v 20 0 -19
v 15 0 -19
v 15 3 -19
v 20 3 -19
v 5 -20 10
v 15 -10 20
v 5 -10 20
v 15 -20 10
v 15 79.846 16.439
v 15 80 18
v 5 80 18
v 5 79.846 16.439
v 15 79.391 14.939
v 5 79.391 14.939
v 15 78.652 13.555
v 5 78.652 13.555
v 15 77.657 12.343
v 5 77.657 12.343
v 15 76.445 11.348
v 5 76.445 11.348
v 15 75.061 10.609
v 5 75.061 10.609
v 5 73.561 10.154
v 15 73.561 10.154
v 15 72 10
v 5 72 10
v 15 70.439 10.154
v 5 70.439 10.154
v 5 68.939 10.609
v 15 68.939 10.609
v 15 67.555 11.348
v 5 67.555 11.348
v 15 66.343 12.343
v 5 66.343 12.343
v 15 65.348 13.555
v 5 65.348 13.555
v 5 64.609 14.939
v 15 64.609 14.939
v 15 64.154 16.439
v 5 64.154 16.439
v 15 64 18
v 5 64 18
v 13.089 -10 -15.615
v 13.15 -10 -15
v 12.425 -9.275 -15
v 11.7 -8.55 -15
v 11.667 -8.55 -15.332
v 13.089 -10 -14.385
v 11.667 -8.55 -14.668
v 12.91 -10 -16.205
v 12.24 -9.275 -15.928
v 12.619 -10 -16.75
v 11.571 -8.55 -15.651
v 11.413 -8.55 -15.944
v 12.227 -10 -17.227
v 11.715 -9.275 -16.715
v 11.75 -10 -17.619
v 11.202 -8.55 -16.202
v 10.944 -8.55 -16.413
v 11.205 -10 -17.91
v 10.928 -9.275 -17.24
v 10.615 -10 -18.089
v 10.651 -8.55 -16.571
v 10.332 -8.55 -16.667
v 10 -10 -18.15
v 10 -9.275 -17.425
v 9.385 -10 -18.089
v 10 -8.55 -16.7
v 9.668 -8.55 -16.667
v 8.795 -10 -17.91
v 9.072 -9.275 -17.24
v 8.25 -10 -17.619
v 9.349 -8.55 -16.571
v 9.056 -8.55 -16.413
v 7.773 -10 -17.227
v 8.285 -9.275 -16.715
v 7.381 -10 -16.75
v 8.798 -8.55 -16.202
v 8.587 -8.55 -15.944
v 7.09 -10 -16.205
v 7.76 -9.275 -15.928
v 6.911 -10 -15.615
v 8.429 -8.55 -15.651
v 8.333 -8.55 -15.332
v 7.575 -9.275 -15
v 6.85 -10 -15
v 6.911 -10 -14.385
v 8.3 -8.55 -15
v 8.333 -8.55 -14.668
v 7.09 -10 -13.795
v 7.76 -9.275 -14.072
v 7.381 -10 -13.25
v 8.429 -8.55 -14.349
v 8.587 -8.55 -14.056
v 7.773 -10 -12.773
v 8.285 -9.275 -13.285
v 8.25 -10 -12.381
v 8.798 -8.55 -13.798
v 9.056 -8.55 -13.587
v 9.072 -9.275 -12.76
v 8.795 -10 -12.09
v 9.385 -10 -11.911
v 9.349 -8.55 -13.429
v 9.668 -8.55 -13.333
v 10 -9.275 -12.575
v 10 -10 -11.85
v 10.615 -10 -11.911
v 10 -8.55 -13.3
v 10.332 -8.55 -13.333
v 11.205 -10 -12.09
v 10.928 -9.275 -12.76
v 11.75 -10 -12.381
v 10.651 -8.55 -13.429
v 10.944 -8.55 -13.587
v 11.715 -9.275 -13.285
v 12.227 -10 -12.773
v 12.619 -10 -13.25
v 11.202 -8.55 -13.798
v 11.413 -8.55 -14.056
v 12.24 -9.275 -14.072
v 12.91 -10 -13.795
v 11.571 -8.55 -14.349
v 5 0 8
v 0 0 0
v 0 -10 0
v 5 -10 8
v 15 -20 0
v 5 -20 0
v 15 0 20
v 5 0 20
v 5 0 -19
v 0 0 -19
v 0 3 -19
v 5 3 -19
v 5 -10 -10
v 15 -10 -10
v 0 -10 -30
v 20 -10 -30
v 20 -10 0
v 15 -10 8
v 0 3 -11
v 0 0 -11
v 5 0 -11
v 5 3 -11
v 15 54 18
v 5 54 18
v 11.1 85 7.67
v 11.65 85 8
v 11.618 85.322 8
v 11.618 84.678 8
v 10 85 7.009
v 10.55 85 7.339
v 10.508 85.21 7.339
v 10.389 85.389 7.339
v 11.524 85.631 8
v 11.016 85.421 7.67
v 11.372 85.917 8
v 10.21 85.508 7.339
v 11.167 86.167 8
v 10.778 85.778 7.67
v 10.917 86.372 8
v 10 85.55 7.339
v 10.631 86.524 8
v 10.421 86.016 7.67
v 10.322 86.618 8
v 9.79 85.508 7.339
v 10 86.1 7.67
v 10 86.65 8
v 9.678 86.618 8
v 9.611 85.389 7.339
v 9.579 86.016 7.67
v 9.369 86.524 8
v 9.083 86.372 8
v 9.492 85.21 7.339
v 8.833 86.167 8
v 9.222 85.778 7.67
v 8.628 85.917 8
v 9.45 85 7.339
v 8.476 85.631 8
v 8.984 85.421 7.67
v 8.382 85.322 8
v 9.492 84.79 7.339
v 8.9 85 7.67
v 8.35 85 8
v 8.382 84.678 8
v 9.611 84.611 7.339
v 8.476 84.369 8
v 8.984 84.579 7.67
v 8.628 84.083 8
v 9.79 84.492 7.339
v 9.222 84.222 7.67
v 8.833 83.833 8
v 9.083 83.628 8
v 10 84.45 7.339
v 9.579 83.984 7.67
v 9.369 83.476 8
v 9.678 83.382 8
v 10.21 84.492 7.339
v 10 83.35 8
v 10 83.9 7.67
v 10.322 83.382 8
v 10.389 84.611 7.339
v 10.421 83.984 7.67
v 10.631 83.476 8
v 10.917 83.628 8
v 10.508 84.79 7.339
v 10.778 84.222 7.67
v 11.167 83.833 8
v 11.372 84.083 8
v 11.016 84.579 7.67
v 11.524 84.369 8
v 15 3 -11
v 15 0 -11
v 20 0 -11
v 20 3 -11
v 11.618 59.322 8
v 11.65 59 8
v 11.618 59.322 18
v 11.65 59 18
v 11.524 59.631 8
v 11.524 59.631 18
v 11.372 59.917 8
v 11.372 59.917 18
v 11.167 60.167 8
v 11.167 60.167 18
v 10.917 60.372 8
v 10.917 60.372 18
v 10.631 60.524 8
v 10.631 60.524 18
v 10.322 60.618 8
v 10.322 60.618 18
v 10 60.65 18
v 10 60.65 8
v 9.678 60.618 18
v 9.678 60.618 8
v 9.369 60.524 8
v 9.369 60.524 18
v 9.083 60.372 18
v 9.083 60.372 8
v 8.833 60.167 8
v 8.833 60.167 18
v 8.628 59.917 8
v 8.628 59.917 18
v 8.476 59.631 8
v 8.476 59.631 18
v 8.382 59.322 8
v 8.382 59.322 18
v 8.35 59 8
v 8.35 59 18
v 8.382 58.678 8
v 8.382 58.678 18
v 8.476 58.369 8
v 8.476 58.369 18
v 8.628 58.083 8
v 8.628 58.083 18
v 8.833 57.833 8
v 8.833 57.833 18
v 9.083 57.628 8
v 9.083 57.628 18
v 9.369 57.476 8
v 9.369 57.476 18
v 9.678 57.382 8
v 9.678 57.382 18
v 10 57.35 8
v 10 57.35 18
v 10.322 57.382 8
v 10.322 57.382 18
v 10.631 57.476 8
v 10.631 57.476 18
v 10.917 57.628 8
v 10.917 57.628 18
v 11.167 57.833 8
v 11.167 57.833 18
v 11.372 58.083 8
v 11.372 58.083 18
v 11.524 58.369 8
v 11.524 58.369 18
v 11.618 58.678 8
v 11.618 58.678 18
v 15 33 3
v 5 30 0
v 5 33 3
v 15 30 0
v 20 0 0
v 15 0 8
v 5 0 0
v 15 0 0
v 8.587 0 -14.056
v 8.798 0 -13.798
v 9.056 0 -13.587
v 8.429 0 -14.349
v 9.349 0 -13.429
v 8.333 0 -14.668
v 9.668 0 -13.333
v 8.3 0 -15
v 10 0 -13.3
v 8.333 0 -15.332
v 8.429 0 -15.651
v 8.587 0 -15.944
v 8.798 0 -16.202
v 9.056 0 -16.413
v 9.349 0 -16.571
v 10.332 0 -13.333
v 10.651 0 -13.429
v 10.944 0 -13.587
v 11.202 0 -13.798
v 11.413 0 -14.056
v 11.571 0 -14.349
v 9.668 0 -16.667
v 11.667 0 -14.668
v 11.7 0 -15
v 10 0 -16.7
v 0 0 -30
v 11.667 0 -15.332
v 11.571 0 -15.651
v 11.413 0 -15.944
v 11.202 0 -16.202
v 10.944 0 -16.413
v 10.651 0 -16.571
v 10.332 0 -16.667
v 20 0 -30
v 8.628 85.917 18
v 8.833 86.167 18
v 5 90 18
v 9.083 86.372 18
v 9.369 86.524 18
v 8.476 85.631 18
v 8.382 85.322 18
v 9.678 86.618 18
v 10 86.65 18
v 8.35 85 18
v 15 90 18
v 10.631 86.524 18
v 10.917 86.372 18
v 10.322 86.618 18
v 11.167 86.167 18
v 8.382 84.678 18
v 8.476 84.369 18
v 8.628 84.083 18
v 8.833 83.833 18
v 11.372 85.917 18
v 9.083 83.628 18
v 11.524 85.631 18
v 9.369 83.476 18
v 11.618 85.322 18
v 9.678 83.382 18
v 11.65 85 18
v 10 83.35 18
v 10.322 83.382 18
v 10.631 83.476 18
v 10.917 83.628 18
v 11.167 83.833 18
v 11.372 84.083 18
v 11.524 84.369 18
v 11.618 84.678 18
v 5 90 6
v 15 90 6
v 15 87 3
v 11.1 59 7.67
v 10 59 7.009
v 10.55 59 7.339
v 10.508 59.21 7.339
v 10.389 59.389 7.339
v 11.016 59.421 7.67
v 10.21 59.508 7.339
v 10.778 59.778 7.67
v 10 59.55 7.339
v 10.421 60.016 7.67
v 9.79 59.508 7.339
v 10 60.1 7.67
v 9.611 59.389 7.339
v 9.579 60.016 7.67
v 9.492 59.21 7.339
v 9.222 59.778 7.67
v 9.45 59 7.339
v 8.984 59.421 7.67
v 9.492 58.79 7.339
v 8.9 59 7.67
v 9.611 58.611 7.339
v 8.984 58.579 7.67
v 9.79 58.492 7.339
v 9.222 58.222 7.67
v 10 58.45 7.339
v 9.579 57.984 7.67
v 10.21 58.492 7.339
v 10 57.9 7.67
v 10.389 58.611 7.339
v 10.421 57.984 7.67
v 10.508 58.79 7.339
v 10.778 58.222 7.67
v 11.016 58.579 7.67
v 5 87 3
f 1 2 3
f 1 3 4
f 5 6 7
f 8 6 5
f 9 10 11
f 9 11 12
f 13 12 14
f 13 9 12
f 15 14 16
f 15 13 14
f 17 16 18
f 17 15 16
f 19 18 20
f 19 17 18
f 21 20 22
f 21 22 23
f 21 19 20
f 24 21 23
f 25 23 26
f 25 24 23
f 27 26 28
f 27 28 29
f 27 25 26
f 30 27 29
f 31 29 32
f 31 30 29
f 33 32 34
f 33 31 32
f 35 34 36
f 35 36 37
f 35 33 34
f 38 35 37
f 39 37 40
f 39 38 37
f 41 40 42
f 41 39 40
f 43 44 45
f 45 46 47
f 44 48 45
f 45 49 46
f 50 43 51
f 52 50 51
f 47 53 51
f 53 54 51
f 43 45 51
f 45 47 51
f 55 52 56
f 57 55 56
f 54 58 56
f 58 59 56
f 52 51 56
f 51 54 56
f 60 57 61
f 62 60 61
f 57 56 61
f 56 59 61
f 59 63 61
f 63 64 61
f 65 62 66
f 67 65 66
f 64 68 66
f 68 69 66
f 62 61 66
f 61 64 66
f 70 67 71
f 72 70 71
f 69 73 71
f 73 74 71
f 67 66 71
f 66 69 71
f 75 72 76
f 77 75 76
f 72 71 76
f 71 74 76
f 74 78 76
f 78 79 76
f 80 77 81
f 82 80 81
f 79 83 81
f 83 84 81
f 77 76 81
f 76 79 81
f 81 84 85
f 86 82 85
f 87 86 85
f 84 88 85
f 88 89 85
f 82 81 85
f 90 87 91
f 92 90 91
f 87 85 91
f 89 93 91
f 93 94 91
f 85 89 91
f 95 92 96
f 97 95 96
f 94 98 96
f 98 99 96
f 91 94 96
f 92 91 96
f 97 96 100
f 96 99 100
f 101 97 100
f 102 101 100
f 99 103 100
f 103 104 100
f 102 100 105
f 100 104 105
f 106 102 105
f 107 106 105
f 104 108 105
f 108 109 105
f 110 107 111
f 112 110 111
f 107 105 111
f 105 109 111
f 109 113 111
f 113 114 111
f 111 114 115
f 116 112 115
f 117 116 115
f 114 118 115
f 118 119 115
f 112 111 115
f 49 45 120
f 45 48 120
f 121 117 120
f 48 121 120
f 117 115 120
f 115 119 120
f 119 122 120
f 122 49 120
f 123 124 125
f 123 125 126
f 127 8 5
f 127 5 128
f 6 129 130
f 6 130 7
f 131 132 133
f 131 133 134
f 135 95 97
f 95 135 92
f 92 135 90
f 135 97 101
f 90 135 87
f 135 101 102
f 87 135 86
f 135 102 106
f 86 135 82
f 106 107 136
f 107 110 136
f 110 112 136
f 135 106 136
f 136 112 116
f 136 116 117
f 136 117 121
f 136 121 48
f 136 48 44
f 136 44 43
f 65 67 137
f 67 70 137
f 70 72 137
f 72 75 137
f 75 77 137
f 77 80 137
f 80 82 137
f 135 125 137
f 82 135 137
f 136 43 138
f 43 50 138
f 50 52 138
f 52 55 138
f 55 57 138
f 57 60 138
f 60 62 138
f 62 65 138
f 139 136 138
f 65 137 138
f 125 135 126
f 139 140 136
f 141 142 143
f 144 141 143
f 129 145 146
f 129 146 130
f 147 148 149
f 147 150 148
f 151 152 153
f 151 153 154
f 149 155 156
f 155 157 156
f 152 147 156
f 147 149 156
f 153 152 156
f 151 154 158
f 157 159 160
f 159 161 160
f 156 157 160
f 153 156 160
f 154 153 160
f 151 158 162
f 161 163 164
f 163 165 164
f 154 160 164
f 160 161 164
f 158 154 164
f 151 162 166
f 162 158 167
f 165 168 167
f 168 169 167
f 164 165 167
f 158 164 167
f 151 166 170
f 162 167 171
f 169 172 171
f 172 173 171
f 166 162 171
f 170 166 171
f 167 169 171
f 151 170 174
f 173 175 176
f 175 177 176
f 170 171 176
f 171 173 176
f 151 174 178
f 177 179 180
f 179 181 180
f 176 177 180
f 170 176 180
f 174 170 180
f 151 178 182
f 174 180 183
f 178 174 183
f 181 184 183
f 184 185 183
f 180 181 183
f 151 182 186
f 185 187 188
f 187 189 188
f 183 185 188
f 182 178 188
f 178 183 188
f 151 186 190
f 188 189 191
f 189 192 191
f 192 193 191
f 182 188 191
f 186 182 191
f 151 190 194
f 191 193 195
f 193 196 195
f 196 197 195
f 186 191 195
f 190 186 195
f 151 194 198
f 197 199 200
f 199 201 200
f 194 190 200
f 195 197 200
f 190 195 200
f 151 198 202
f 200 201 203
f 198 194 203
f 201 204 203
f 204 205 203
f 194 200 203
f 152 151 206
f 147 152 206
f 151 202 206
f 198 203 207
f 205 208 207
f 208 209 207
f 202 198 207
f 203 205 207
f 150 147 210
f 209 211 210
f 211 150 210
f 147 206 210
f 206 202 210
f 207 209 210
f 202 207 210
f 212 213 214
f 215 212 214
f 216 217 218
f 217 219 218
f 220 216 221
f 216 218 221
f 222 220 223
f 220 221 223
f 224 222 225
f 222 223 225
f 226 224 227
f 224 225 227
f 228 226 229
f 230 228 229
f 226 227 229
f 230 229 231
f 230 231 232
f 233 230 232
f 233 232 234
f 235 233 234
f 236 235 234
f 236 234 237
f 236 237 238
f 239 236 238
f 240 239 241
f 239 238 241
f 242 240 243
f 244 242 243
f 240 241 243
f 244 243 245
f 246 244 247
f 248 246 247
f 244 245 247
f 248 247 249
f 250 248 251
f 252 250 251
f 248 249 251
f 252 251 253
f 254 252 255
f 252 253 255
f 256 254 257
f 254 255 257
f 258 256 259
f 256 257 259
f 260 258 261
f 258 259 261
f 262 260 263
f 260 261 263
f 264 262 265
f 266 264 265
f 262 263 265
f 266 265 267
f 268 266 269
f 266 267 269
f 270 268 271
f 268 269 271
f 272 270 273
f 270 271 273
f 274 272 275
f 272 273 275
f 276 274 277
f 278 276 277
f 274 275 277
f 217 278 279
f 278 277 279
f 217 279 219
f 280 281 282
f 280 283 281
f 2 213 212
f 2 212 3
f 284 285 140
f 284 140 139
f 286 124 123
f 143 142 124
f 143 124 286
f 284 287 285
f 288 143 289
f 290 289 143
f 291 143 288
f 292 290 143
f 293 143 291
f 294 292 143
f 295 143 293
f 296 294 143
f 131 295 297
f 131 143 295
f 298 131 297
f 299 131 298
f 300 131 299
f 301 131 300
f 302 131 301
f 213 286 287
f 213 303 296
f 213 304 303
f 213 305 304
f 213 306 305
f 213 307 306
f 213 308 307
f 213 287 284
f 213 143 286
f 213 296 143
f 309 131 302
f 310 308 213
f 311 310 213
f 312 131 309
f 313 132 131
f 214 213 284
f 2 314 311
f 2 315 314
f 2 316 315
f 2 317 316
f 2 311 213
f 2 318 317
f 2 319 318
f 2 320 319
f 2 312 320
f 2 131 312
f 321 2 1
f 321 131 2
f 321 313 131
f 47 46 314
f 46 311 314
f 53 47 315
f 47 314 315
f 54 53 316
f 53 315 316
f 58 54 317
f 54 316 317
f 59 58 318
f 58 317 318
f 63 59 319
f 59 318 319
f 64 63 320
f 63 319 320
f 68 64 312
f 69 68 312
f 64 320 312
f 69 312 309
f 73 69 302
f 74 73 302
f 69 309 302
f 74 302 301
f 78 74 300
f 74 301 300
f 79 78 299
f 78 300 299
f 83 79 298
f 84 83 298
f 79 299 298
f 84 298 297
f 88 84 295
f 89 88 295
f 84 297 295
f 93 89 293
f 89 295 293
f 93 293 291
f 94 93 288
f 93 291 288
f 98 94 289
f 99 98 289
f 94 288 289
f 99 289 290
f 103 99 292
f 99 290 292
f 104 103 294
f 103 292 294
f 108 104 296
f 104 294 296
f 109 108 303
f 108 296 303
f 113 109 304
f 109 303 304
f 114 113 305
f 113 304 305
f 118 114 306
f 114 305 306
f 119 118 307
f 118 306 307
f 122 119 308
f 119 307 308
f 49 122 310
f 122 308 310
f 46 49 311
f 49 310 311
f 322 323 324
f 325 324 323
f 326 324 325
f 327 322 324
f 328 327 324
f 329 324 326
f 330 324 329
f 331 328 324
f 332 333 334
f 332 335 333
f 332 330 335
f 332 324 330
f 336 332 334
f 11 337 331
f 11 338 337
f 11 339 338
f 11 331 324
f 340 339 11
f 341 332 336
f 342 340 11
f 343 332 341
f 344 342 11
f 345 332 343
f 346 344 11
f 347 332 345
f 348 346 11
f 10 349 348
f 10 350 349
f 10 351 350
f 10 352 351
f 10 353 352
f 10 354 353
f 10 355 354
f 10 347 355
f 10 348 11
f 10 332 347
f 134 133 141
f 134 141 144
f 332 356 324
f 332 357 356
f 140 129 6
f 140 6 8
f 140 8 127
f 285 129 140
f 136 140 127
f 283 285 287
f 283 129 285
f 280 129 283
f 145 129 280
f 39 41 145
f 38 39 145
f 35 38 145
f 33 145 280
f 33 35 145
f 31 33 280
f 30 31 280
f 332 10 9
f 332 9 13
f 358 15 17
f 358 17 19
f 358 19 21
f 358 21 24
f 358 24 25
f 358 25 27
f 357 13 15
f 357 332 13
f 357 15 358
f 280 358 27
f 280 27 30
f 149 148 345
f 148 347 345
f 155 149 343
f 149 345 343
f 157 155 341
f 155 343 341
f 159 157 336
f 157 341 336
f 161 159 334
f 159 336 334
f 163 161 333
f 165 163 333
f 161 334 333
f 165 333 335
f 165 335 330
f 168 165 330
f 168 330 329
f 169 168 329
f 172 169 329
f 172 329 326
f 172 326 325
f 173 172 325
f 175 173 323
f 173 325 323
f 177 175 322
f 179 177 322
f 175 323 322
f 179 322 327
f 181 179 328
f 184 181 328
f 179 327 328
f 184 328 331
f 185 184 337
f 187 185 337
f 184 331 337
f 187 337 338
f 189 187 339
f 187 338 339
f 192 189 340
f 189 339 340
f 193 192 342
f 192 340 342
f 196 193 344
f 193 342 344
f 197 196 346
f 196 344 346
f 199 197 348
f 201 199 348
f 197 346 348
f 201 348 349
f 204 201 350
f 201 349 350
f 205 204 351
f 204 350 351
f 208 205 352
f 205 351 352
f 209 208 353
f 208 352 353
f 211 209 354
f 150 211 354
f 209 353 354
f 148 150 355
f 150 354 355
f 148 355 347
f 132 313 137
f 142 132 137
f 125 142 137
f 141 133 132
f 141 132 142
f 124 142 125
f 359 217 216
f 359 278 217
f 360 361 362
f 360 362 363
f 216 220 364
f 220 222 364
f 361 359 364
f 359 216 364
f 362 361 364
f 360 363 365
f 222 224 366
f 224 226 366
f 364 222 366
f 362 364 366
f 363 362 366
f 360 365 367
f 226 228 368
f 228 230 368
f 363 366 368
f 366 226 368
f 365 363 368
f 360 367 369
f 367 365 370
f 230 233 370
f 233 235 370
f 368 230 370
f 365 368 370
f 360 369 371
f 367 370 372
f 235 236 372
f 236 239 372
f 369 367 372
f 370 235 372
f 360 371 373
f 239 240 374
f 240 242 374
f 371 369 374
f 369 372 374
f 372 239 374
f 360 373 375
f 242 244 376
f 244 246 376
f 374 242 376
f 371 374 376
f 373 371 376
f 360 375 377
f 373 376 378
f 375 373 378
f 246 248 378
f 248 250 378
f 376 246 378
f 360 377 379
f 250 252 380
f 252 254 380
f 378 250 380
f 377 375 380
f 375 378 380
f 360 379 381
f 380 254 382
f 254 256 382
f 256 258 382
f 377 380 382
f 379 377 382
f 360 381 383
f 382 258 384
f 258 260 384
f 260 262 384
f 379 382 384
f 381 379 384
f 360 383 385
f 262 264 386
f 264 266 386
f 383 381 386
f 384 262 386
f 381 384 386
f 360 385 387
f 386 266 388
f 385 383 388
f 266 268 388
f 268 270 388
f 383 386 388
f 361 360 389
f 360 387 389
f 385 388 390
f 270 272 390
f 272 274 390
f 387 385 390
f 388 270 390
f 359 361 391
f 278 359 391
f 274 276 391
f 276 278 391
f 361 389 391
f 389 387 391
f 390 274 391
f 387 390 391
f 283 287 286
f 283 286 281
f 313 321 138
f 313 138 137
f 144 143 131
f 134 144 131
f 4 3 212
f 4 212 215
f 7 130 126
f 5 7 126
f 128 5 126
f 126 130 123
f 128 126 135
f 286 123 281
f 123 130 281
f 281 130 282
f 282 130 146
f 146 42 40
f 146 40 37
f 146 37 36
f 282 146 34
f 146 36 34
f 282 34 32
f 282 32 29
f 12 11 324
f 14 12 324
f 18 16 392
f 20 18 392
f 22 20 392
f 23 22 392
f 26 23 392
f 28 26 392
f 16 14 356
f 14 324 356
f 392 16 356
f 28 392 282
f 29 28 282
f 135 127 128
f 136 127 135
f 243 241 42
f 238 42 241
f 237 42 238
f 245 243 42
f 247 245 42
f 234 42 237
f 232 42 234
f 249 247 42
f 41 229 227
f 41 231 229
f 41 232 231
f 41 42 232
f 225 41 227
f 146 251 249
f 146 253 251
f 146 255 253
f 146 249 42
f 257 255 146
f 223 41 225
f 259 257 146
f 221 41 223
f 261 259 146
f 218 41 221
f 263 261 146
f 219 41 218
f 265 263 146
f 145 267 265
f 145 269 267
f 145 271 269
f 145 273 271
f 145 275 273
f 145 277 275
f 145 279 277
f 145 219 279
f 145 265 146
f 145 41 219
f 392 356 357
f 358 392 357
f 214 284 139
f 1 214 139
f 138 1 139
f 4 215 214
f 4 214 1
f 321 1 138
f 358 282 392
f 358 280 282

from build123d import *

# Parameters (mm, degrees)
EXTRUDE_1_DEPTH = 10
EXTRUDE_2_DEPTH = 5
SKETCH_4_W      = 5
SKETCH_4_H      = 8
EXTRUDE_3_DEPTH = 3
CHAMFER_1_SIZE  = 3


# Read off the part's stored shape, not the designer's step: 高级异型孔3, 高级异型孔4
with BuildPart() as part:
    # 草图1 → 凸台-拉伸1 (new body)
    with BuildSketch(Plane(origin=(0, 0, 0), x_dir=(1, 0, 0), z_dir=(0, 1, 0))):
        Polygon((0, 0), (5, -8), (5, 0), (15, 0), (15, -8), (20, 0), (20, 30), (0, 30), align=None)
    extrude(amount=-EXTRUDE_1_DEPTH)

    # 草图2 → 凸台-拉伸2 (add, symmetric)
    with BuildSketch(Plane(origin=(10, 0, 0), x_dir=(0, 0, -1), z_dir=(1, 0, 0))):
        with BuildLine():
            Line((0, 30), (-3, 33))
            Line((-3, 33), (-3, 90))
            Line((-3, 90), (-18, 90))
            Line((-18, 90), (-18, 80))
            ThreePointArc((-18, 80), (-10, 72), (-18, 64))
            Line((-18, 64), (-18, 54))
            Line((-18, 54), (-20, 0))
            Line((-20, 0), (-20, -10))
            Line((-20, -10), (-10, -20))
            Line((-10, -20), (0, -20))
            Line((0, -20), (10, -10))
            Line((10, -10), (0, -10))
            Line((0, -10), (0, 30))
        make_face()
    extrude(amount=EXTRUDE_2_DEPTH, both=True)

    # 草图4 → 凸台-拉伸3 (add)
    with BuildSketch(Plane(origin=(0, 0, 0), x_dir=(1, 0, 0), z_dir=(0, 1, 0))):
        with Locations((2.5, 15)):
            Rectangle(SKETCH_4_W, SKETCH_4_H)
        with Locations((17.5, 15)):
            Rectangle(SKETCH_4_W, SKETCH_4_H)
    extrude(amount=EXTRUDE_3_DEPTH)

    # 高级异型孔3 outline → 高级异型孔3 (revolve, cut)
    with BuildSketch(Plane(origin=(10, 0, -15), x_dir=(1, 0, 0), z_dir=(0, 0, 1))):
        Polygon((0, -10), (3.15, -10), (1.7, -8.55), (1.7, 0), (0, 0), align=None)
    revolve(axis=Axis((10, 0, -15), (0, 1, 0)), mode=Mode.SUBTRACT)

    # 高级异型孔4 outline → 高级异型孔4 (revolve, cut)
    with BuildSketch(Plane(origin=(10, 59, 0), x_dir=(1, 0, 0), z_dir=(0, -1, 0))):
        Polygon((0, 7.008579979), (1.65, 8), (1.65, 18), (0, 18), align=None)
    revolve(axis=Axis((10, 59, 0), (0, 0, 1)), mode=Mode.SUBTRACT)

    # Other 4 2 outline → Other 4 2 (revolve, cut)
    with BuildSketch(Plane(origin=(10, 85, 0), x_dir=(1, 0, 0), z_dir=(0, -1, 0))):
        Polygon((0, 7.008579979), (1.65, 8), (1.65, 18), (0, 18), align=None)
    revolve(axis=Axis((10, 85, 0), (0, 0, 1)), mode=Mode.SUBTRACT)

    # 倒角1
    chamfer_1_edges = [part.edges().sort_by_distance(p)[0] for p in [
        (10, 90, 3),
    ]]
    chamfer(chamfer_1_edges, length=CHAMFER_1_SIZE)


solid = part.part
